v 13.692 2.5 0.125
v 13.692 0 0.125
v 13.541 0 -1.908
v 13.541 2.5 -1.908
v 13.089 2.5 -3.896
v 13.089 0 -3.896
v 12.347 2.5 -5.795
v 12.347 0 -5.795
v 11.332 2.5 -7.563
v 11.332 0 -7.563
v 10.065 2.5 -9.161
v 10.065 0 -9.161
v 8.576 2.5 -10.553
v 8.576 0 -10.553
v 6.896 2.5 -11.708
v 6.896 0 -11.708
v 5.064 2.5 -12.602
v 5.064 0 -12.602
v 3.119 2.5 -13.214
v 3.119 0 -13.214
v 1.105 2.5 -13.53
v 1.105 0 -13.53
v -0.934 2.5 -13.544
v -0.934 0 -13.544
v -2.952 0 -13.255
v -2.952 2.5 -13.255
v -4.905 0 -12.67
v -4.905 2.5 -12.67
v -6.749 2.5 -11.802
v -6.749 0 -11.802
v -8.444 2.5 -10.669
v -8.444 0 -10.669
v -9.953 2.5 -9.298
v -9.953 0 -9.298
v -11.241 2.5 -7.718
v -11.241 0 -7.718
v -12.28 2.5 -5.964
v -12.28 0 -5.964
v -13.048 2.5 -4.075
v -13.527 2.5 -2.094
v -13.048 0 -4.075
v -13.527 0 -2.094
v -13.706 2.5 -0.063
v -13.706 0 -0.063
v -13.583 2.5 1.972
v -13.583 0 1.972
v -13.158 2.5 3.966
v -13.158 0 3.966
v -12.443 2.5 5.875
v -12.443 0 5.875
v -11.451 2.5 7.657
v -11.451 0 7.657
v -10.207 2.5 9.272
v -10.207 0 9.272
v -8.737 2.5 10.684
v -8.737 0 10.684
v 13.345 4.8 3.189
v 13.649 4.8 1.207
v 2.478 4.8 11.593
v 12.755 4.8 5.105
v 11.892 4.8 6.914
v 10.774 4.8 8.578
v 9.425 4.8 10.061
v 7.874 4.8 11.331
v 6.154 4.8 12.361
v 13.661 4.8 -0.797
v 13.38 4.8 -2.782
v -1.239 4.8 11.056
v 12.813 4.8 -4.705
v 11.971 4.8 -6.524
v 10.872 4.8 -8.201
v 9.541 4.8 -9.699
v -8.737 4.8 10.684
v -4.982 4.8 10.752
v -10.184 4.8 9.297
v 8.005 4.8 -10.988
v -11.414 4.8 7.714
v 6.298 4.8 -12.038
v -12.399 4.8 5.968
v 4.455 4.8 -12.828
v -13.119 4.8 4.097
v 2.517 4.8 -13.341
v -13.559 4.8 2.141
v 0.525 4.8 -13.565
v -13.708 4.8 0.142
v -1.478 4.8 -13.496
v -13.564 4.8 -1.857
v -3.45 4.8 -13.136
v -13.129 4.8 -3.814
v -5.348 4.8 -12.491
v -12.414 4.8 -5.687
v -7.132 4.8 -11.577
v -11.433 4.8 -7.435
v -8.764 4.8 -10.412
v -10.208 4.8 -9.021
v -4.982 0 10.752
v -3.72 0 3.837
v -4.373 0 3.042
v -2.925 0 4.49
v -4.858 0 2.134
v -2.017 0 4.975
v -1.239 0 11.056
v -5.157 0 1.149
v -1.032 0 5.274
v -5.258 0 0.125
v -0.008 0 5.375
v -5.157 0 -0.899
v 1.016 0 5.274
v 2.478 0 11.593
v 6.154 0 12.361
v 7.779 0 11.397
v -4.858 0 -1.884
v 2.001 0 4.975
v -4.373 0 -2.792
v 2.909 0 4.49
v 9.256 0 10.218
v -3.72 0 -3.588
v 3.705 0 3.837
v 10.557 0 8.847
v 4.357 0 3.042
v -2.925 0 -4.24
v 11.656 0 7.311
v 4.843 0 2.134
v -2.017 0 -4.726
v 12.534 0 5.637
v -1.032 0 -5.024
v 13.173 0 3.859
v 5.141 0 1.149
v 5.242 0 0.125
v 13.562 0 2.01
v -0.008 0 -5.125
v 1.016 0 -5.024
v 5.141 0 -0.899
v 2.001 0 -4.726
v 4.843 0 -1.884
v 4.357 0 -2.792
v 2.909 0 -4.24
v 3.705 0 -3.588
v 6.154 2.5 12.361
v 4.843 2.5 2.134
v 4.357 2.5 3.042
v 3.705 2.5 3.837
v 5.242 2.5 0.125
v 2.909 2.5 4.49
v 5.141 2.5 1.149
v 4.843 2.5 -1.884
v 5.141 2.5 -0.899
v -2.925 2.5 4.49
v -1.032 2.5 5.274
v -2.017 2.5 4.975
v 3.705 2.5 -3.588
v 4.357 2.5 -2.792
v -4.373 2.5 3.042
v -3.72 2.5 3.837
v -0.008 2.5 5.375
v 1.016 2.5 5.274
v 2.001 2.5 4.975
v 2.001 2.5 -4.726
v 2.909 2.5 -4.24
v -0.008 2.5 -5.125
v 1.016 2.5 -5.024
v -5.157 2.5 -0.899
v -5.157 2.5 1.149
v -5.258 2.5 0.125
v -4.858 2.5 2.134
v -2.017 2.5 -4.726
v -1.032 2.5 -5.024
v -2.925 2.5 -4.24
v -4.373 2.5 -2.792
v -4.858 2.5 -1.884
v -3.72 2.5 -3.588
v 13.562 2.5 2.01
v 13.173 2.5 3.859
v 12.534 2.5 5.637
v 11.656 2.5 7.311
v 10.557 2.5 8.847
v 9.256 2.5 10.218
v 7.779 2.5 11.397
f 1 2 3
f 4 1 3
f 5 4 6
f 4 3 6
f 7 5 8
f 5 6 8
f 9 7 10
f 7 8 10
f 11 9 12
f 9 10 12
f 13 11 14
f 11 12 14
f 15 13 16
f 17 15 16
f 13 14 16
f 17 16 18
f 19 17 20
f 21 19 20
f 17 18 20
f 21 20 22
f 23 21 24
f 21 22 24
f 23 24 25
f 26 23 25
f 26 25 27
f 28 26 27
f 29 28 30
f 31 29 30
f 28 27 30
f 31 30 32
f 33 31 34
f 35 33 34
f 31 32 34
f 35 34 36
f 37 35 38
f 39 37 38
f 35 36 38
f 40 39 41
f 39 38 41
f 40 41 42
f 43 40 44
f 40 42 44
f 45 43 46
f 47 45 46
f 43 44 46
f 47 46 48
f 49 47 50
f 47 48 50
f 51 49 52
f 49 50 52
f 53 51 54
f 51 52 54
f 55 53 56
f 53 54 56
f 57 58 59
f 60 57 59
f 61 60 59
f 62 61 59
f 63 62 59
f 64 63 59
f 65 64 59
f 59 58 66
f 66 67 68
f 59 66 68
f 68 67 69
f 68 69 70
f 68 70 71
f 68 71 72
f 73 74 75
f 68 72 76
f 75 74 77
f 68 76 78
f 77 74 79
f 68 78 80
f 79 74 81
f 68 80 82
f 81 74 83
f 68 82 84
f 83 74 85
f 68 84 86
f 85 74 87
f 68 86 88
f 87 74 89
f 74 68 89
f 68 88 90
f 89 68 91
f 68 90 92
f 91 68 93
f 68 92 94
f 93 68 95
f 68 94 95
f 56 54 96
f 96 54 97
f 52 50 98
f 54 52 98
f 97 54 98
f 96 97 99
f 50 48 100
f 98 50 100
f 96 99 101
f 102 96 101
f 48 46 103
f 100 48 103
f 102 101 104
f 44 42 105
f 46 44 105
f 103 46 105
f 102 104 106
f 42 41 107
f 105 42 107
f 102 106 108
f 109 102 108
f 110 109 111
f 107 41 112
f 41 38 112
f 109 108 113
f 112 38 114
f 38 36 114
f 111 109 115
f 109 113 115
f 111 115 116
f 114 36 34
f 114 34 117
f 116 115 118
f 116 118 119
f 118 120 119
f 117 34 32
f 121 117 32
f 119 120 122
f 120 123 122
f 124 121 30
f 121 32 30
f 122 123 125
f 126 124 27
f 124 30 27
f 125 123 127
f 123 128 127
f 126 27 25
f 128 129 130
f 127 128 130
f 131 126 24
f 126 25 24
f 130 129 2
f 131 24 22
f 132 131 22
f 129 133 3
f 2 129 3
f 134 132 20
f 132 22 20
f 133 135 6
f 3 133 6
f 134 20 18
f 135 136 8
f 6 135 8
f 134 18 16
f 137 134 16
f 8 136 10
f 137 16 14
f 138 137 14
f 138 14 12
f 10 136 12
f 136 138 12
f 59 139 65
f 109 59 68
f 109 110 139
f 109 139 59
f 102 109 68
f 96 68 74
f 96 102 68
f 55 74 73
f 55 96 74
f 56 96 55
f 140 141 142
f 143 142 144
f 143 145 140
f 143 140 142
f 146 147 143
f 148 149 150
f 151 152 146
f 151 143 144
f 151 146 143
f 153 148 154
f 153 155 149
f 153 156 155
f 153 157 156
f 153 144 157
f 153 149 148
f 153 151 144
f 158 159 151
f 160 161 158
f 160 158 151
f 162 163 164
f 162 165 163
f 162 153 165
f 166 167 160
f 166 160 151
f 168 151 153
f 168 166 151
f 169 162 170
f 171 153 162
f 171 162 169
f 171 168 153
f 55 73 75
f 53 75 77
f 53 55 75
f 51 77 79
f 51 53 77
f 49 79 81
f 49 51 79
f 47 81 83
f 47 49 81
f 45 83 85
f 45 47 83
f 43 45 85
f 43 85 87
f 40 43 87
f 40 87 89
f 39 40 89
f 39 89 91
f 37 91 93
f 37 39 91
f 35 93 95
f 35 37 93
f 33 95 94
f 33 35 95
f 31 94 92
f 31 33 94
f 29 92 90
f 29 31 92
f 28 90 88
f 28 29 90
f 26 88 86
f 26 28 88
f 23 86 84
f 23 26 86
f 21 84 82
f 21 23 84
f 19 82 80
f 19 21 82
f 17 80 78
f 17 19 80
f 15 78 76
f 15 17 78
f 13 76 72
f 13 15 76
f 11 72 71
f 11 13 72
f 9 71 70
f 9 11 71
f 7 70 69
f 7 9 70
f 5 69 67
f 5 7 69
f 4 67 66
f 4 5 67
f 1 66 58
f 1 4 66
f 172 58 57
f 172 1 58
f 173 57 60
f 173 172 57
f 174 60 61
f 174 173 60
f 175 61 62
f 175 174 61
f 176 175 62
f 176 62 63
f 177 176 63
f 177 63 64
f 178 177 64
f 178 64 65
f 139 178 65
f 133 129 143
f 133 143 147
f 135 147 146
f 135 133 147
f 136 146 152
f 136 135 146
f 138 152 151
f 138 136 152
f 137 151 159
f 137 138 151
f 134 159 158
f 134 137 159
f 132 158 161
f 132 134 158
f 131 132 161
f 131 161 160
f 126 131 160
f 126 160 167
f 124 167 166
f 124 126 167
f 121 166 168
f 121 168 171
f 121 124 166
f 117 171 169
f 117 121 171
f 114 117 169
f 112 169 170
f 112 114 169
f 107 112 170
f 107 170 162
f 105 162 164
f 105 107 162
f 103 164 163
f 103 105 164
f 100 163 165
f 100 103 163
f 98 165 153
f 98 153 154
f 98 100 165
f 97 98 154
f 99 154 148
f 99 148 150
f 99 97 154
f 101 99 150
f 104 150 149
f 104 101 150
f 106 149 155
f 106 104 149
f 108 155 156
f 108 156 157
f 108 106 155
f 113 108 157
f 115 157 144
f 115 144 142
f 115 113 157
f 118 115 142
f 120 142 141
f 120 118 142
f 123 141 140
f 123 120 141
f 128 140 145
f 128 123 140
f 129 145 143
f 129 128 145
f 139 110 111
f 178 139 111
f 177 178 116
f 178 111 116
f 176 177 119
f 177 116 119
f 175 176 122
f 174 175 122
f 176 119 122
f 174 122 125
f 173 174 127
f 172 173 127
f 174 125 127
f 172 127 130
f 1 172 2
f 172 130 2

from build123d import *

# Parameters (mm, degrees)
SKETCH1_R           = 5.25
BOSS_EXTRUDE1_DEPTH = 2.5
BOSS_EXTRUDE2_DEPTH = 2.3


with BuildPart() as part:
    # Sketch1 → Boss-Extrude1 (new body)
    with BuildSketch(Plane(origin=(0, 0, 0), x_dir=(1, 0, 0), z_dir=(0, 1, 0))):
        with BuildLine():
            ThreePointArc((6.154078518, -12.360831122), (11.656426966, -7.310595529), (13.692219593, -0.124757626))
            ThreePointArc((13.692219593, -0.124757626), (-5.843155784, 12.270337945), (-8.736743065, -10.683886895))
            ThreePointArc((-8.736743065, -10.683886895), (-1.238774651, -11.05566121), (6.154078518, -12.360831122))
        make_face()
        with Locations((-0.007780407, -0.124757626)):
            Circle(SKETCH1_R, mode=Mode.SUBTRACT)
    extrude(amount=BOSS_EXTRUDE1_DEPTH)

    # Sketch2 → Boss-Extrude2 (add)
    with BuildSketch(Plane(origin=(0, 2.5, 0), x_dir=(1, 0, 0), z_dir=(0, 1, 0))):
        with BuildLine():
            ThreePointArc((6.154078518, -12.360831122), (-1.238774651, -11.05566121), (-8.736743065, -10.683886895))
            ThreePointArc((-8.736743065, -10.683886895), (1.52536697, 13.489185929), (6.154078518, -12.360831122))
        make_face()
    extrude(amount=BOSS_EXTRUDE2_DEPTH)


solid = part.part
